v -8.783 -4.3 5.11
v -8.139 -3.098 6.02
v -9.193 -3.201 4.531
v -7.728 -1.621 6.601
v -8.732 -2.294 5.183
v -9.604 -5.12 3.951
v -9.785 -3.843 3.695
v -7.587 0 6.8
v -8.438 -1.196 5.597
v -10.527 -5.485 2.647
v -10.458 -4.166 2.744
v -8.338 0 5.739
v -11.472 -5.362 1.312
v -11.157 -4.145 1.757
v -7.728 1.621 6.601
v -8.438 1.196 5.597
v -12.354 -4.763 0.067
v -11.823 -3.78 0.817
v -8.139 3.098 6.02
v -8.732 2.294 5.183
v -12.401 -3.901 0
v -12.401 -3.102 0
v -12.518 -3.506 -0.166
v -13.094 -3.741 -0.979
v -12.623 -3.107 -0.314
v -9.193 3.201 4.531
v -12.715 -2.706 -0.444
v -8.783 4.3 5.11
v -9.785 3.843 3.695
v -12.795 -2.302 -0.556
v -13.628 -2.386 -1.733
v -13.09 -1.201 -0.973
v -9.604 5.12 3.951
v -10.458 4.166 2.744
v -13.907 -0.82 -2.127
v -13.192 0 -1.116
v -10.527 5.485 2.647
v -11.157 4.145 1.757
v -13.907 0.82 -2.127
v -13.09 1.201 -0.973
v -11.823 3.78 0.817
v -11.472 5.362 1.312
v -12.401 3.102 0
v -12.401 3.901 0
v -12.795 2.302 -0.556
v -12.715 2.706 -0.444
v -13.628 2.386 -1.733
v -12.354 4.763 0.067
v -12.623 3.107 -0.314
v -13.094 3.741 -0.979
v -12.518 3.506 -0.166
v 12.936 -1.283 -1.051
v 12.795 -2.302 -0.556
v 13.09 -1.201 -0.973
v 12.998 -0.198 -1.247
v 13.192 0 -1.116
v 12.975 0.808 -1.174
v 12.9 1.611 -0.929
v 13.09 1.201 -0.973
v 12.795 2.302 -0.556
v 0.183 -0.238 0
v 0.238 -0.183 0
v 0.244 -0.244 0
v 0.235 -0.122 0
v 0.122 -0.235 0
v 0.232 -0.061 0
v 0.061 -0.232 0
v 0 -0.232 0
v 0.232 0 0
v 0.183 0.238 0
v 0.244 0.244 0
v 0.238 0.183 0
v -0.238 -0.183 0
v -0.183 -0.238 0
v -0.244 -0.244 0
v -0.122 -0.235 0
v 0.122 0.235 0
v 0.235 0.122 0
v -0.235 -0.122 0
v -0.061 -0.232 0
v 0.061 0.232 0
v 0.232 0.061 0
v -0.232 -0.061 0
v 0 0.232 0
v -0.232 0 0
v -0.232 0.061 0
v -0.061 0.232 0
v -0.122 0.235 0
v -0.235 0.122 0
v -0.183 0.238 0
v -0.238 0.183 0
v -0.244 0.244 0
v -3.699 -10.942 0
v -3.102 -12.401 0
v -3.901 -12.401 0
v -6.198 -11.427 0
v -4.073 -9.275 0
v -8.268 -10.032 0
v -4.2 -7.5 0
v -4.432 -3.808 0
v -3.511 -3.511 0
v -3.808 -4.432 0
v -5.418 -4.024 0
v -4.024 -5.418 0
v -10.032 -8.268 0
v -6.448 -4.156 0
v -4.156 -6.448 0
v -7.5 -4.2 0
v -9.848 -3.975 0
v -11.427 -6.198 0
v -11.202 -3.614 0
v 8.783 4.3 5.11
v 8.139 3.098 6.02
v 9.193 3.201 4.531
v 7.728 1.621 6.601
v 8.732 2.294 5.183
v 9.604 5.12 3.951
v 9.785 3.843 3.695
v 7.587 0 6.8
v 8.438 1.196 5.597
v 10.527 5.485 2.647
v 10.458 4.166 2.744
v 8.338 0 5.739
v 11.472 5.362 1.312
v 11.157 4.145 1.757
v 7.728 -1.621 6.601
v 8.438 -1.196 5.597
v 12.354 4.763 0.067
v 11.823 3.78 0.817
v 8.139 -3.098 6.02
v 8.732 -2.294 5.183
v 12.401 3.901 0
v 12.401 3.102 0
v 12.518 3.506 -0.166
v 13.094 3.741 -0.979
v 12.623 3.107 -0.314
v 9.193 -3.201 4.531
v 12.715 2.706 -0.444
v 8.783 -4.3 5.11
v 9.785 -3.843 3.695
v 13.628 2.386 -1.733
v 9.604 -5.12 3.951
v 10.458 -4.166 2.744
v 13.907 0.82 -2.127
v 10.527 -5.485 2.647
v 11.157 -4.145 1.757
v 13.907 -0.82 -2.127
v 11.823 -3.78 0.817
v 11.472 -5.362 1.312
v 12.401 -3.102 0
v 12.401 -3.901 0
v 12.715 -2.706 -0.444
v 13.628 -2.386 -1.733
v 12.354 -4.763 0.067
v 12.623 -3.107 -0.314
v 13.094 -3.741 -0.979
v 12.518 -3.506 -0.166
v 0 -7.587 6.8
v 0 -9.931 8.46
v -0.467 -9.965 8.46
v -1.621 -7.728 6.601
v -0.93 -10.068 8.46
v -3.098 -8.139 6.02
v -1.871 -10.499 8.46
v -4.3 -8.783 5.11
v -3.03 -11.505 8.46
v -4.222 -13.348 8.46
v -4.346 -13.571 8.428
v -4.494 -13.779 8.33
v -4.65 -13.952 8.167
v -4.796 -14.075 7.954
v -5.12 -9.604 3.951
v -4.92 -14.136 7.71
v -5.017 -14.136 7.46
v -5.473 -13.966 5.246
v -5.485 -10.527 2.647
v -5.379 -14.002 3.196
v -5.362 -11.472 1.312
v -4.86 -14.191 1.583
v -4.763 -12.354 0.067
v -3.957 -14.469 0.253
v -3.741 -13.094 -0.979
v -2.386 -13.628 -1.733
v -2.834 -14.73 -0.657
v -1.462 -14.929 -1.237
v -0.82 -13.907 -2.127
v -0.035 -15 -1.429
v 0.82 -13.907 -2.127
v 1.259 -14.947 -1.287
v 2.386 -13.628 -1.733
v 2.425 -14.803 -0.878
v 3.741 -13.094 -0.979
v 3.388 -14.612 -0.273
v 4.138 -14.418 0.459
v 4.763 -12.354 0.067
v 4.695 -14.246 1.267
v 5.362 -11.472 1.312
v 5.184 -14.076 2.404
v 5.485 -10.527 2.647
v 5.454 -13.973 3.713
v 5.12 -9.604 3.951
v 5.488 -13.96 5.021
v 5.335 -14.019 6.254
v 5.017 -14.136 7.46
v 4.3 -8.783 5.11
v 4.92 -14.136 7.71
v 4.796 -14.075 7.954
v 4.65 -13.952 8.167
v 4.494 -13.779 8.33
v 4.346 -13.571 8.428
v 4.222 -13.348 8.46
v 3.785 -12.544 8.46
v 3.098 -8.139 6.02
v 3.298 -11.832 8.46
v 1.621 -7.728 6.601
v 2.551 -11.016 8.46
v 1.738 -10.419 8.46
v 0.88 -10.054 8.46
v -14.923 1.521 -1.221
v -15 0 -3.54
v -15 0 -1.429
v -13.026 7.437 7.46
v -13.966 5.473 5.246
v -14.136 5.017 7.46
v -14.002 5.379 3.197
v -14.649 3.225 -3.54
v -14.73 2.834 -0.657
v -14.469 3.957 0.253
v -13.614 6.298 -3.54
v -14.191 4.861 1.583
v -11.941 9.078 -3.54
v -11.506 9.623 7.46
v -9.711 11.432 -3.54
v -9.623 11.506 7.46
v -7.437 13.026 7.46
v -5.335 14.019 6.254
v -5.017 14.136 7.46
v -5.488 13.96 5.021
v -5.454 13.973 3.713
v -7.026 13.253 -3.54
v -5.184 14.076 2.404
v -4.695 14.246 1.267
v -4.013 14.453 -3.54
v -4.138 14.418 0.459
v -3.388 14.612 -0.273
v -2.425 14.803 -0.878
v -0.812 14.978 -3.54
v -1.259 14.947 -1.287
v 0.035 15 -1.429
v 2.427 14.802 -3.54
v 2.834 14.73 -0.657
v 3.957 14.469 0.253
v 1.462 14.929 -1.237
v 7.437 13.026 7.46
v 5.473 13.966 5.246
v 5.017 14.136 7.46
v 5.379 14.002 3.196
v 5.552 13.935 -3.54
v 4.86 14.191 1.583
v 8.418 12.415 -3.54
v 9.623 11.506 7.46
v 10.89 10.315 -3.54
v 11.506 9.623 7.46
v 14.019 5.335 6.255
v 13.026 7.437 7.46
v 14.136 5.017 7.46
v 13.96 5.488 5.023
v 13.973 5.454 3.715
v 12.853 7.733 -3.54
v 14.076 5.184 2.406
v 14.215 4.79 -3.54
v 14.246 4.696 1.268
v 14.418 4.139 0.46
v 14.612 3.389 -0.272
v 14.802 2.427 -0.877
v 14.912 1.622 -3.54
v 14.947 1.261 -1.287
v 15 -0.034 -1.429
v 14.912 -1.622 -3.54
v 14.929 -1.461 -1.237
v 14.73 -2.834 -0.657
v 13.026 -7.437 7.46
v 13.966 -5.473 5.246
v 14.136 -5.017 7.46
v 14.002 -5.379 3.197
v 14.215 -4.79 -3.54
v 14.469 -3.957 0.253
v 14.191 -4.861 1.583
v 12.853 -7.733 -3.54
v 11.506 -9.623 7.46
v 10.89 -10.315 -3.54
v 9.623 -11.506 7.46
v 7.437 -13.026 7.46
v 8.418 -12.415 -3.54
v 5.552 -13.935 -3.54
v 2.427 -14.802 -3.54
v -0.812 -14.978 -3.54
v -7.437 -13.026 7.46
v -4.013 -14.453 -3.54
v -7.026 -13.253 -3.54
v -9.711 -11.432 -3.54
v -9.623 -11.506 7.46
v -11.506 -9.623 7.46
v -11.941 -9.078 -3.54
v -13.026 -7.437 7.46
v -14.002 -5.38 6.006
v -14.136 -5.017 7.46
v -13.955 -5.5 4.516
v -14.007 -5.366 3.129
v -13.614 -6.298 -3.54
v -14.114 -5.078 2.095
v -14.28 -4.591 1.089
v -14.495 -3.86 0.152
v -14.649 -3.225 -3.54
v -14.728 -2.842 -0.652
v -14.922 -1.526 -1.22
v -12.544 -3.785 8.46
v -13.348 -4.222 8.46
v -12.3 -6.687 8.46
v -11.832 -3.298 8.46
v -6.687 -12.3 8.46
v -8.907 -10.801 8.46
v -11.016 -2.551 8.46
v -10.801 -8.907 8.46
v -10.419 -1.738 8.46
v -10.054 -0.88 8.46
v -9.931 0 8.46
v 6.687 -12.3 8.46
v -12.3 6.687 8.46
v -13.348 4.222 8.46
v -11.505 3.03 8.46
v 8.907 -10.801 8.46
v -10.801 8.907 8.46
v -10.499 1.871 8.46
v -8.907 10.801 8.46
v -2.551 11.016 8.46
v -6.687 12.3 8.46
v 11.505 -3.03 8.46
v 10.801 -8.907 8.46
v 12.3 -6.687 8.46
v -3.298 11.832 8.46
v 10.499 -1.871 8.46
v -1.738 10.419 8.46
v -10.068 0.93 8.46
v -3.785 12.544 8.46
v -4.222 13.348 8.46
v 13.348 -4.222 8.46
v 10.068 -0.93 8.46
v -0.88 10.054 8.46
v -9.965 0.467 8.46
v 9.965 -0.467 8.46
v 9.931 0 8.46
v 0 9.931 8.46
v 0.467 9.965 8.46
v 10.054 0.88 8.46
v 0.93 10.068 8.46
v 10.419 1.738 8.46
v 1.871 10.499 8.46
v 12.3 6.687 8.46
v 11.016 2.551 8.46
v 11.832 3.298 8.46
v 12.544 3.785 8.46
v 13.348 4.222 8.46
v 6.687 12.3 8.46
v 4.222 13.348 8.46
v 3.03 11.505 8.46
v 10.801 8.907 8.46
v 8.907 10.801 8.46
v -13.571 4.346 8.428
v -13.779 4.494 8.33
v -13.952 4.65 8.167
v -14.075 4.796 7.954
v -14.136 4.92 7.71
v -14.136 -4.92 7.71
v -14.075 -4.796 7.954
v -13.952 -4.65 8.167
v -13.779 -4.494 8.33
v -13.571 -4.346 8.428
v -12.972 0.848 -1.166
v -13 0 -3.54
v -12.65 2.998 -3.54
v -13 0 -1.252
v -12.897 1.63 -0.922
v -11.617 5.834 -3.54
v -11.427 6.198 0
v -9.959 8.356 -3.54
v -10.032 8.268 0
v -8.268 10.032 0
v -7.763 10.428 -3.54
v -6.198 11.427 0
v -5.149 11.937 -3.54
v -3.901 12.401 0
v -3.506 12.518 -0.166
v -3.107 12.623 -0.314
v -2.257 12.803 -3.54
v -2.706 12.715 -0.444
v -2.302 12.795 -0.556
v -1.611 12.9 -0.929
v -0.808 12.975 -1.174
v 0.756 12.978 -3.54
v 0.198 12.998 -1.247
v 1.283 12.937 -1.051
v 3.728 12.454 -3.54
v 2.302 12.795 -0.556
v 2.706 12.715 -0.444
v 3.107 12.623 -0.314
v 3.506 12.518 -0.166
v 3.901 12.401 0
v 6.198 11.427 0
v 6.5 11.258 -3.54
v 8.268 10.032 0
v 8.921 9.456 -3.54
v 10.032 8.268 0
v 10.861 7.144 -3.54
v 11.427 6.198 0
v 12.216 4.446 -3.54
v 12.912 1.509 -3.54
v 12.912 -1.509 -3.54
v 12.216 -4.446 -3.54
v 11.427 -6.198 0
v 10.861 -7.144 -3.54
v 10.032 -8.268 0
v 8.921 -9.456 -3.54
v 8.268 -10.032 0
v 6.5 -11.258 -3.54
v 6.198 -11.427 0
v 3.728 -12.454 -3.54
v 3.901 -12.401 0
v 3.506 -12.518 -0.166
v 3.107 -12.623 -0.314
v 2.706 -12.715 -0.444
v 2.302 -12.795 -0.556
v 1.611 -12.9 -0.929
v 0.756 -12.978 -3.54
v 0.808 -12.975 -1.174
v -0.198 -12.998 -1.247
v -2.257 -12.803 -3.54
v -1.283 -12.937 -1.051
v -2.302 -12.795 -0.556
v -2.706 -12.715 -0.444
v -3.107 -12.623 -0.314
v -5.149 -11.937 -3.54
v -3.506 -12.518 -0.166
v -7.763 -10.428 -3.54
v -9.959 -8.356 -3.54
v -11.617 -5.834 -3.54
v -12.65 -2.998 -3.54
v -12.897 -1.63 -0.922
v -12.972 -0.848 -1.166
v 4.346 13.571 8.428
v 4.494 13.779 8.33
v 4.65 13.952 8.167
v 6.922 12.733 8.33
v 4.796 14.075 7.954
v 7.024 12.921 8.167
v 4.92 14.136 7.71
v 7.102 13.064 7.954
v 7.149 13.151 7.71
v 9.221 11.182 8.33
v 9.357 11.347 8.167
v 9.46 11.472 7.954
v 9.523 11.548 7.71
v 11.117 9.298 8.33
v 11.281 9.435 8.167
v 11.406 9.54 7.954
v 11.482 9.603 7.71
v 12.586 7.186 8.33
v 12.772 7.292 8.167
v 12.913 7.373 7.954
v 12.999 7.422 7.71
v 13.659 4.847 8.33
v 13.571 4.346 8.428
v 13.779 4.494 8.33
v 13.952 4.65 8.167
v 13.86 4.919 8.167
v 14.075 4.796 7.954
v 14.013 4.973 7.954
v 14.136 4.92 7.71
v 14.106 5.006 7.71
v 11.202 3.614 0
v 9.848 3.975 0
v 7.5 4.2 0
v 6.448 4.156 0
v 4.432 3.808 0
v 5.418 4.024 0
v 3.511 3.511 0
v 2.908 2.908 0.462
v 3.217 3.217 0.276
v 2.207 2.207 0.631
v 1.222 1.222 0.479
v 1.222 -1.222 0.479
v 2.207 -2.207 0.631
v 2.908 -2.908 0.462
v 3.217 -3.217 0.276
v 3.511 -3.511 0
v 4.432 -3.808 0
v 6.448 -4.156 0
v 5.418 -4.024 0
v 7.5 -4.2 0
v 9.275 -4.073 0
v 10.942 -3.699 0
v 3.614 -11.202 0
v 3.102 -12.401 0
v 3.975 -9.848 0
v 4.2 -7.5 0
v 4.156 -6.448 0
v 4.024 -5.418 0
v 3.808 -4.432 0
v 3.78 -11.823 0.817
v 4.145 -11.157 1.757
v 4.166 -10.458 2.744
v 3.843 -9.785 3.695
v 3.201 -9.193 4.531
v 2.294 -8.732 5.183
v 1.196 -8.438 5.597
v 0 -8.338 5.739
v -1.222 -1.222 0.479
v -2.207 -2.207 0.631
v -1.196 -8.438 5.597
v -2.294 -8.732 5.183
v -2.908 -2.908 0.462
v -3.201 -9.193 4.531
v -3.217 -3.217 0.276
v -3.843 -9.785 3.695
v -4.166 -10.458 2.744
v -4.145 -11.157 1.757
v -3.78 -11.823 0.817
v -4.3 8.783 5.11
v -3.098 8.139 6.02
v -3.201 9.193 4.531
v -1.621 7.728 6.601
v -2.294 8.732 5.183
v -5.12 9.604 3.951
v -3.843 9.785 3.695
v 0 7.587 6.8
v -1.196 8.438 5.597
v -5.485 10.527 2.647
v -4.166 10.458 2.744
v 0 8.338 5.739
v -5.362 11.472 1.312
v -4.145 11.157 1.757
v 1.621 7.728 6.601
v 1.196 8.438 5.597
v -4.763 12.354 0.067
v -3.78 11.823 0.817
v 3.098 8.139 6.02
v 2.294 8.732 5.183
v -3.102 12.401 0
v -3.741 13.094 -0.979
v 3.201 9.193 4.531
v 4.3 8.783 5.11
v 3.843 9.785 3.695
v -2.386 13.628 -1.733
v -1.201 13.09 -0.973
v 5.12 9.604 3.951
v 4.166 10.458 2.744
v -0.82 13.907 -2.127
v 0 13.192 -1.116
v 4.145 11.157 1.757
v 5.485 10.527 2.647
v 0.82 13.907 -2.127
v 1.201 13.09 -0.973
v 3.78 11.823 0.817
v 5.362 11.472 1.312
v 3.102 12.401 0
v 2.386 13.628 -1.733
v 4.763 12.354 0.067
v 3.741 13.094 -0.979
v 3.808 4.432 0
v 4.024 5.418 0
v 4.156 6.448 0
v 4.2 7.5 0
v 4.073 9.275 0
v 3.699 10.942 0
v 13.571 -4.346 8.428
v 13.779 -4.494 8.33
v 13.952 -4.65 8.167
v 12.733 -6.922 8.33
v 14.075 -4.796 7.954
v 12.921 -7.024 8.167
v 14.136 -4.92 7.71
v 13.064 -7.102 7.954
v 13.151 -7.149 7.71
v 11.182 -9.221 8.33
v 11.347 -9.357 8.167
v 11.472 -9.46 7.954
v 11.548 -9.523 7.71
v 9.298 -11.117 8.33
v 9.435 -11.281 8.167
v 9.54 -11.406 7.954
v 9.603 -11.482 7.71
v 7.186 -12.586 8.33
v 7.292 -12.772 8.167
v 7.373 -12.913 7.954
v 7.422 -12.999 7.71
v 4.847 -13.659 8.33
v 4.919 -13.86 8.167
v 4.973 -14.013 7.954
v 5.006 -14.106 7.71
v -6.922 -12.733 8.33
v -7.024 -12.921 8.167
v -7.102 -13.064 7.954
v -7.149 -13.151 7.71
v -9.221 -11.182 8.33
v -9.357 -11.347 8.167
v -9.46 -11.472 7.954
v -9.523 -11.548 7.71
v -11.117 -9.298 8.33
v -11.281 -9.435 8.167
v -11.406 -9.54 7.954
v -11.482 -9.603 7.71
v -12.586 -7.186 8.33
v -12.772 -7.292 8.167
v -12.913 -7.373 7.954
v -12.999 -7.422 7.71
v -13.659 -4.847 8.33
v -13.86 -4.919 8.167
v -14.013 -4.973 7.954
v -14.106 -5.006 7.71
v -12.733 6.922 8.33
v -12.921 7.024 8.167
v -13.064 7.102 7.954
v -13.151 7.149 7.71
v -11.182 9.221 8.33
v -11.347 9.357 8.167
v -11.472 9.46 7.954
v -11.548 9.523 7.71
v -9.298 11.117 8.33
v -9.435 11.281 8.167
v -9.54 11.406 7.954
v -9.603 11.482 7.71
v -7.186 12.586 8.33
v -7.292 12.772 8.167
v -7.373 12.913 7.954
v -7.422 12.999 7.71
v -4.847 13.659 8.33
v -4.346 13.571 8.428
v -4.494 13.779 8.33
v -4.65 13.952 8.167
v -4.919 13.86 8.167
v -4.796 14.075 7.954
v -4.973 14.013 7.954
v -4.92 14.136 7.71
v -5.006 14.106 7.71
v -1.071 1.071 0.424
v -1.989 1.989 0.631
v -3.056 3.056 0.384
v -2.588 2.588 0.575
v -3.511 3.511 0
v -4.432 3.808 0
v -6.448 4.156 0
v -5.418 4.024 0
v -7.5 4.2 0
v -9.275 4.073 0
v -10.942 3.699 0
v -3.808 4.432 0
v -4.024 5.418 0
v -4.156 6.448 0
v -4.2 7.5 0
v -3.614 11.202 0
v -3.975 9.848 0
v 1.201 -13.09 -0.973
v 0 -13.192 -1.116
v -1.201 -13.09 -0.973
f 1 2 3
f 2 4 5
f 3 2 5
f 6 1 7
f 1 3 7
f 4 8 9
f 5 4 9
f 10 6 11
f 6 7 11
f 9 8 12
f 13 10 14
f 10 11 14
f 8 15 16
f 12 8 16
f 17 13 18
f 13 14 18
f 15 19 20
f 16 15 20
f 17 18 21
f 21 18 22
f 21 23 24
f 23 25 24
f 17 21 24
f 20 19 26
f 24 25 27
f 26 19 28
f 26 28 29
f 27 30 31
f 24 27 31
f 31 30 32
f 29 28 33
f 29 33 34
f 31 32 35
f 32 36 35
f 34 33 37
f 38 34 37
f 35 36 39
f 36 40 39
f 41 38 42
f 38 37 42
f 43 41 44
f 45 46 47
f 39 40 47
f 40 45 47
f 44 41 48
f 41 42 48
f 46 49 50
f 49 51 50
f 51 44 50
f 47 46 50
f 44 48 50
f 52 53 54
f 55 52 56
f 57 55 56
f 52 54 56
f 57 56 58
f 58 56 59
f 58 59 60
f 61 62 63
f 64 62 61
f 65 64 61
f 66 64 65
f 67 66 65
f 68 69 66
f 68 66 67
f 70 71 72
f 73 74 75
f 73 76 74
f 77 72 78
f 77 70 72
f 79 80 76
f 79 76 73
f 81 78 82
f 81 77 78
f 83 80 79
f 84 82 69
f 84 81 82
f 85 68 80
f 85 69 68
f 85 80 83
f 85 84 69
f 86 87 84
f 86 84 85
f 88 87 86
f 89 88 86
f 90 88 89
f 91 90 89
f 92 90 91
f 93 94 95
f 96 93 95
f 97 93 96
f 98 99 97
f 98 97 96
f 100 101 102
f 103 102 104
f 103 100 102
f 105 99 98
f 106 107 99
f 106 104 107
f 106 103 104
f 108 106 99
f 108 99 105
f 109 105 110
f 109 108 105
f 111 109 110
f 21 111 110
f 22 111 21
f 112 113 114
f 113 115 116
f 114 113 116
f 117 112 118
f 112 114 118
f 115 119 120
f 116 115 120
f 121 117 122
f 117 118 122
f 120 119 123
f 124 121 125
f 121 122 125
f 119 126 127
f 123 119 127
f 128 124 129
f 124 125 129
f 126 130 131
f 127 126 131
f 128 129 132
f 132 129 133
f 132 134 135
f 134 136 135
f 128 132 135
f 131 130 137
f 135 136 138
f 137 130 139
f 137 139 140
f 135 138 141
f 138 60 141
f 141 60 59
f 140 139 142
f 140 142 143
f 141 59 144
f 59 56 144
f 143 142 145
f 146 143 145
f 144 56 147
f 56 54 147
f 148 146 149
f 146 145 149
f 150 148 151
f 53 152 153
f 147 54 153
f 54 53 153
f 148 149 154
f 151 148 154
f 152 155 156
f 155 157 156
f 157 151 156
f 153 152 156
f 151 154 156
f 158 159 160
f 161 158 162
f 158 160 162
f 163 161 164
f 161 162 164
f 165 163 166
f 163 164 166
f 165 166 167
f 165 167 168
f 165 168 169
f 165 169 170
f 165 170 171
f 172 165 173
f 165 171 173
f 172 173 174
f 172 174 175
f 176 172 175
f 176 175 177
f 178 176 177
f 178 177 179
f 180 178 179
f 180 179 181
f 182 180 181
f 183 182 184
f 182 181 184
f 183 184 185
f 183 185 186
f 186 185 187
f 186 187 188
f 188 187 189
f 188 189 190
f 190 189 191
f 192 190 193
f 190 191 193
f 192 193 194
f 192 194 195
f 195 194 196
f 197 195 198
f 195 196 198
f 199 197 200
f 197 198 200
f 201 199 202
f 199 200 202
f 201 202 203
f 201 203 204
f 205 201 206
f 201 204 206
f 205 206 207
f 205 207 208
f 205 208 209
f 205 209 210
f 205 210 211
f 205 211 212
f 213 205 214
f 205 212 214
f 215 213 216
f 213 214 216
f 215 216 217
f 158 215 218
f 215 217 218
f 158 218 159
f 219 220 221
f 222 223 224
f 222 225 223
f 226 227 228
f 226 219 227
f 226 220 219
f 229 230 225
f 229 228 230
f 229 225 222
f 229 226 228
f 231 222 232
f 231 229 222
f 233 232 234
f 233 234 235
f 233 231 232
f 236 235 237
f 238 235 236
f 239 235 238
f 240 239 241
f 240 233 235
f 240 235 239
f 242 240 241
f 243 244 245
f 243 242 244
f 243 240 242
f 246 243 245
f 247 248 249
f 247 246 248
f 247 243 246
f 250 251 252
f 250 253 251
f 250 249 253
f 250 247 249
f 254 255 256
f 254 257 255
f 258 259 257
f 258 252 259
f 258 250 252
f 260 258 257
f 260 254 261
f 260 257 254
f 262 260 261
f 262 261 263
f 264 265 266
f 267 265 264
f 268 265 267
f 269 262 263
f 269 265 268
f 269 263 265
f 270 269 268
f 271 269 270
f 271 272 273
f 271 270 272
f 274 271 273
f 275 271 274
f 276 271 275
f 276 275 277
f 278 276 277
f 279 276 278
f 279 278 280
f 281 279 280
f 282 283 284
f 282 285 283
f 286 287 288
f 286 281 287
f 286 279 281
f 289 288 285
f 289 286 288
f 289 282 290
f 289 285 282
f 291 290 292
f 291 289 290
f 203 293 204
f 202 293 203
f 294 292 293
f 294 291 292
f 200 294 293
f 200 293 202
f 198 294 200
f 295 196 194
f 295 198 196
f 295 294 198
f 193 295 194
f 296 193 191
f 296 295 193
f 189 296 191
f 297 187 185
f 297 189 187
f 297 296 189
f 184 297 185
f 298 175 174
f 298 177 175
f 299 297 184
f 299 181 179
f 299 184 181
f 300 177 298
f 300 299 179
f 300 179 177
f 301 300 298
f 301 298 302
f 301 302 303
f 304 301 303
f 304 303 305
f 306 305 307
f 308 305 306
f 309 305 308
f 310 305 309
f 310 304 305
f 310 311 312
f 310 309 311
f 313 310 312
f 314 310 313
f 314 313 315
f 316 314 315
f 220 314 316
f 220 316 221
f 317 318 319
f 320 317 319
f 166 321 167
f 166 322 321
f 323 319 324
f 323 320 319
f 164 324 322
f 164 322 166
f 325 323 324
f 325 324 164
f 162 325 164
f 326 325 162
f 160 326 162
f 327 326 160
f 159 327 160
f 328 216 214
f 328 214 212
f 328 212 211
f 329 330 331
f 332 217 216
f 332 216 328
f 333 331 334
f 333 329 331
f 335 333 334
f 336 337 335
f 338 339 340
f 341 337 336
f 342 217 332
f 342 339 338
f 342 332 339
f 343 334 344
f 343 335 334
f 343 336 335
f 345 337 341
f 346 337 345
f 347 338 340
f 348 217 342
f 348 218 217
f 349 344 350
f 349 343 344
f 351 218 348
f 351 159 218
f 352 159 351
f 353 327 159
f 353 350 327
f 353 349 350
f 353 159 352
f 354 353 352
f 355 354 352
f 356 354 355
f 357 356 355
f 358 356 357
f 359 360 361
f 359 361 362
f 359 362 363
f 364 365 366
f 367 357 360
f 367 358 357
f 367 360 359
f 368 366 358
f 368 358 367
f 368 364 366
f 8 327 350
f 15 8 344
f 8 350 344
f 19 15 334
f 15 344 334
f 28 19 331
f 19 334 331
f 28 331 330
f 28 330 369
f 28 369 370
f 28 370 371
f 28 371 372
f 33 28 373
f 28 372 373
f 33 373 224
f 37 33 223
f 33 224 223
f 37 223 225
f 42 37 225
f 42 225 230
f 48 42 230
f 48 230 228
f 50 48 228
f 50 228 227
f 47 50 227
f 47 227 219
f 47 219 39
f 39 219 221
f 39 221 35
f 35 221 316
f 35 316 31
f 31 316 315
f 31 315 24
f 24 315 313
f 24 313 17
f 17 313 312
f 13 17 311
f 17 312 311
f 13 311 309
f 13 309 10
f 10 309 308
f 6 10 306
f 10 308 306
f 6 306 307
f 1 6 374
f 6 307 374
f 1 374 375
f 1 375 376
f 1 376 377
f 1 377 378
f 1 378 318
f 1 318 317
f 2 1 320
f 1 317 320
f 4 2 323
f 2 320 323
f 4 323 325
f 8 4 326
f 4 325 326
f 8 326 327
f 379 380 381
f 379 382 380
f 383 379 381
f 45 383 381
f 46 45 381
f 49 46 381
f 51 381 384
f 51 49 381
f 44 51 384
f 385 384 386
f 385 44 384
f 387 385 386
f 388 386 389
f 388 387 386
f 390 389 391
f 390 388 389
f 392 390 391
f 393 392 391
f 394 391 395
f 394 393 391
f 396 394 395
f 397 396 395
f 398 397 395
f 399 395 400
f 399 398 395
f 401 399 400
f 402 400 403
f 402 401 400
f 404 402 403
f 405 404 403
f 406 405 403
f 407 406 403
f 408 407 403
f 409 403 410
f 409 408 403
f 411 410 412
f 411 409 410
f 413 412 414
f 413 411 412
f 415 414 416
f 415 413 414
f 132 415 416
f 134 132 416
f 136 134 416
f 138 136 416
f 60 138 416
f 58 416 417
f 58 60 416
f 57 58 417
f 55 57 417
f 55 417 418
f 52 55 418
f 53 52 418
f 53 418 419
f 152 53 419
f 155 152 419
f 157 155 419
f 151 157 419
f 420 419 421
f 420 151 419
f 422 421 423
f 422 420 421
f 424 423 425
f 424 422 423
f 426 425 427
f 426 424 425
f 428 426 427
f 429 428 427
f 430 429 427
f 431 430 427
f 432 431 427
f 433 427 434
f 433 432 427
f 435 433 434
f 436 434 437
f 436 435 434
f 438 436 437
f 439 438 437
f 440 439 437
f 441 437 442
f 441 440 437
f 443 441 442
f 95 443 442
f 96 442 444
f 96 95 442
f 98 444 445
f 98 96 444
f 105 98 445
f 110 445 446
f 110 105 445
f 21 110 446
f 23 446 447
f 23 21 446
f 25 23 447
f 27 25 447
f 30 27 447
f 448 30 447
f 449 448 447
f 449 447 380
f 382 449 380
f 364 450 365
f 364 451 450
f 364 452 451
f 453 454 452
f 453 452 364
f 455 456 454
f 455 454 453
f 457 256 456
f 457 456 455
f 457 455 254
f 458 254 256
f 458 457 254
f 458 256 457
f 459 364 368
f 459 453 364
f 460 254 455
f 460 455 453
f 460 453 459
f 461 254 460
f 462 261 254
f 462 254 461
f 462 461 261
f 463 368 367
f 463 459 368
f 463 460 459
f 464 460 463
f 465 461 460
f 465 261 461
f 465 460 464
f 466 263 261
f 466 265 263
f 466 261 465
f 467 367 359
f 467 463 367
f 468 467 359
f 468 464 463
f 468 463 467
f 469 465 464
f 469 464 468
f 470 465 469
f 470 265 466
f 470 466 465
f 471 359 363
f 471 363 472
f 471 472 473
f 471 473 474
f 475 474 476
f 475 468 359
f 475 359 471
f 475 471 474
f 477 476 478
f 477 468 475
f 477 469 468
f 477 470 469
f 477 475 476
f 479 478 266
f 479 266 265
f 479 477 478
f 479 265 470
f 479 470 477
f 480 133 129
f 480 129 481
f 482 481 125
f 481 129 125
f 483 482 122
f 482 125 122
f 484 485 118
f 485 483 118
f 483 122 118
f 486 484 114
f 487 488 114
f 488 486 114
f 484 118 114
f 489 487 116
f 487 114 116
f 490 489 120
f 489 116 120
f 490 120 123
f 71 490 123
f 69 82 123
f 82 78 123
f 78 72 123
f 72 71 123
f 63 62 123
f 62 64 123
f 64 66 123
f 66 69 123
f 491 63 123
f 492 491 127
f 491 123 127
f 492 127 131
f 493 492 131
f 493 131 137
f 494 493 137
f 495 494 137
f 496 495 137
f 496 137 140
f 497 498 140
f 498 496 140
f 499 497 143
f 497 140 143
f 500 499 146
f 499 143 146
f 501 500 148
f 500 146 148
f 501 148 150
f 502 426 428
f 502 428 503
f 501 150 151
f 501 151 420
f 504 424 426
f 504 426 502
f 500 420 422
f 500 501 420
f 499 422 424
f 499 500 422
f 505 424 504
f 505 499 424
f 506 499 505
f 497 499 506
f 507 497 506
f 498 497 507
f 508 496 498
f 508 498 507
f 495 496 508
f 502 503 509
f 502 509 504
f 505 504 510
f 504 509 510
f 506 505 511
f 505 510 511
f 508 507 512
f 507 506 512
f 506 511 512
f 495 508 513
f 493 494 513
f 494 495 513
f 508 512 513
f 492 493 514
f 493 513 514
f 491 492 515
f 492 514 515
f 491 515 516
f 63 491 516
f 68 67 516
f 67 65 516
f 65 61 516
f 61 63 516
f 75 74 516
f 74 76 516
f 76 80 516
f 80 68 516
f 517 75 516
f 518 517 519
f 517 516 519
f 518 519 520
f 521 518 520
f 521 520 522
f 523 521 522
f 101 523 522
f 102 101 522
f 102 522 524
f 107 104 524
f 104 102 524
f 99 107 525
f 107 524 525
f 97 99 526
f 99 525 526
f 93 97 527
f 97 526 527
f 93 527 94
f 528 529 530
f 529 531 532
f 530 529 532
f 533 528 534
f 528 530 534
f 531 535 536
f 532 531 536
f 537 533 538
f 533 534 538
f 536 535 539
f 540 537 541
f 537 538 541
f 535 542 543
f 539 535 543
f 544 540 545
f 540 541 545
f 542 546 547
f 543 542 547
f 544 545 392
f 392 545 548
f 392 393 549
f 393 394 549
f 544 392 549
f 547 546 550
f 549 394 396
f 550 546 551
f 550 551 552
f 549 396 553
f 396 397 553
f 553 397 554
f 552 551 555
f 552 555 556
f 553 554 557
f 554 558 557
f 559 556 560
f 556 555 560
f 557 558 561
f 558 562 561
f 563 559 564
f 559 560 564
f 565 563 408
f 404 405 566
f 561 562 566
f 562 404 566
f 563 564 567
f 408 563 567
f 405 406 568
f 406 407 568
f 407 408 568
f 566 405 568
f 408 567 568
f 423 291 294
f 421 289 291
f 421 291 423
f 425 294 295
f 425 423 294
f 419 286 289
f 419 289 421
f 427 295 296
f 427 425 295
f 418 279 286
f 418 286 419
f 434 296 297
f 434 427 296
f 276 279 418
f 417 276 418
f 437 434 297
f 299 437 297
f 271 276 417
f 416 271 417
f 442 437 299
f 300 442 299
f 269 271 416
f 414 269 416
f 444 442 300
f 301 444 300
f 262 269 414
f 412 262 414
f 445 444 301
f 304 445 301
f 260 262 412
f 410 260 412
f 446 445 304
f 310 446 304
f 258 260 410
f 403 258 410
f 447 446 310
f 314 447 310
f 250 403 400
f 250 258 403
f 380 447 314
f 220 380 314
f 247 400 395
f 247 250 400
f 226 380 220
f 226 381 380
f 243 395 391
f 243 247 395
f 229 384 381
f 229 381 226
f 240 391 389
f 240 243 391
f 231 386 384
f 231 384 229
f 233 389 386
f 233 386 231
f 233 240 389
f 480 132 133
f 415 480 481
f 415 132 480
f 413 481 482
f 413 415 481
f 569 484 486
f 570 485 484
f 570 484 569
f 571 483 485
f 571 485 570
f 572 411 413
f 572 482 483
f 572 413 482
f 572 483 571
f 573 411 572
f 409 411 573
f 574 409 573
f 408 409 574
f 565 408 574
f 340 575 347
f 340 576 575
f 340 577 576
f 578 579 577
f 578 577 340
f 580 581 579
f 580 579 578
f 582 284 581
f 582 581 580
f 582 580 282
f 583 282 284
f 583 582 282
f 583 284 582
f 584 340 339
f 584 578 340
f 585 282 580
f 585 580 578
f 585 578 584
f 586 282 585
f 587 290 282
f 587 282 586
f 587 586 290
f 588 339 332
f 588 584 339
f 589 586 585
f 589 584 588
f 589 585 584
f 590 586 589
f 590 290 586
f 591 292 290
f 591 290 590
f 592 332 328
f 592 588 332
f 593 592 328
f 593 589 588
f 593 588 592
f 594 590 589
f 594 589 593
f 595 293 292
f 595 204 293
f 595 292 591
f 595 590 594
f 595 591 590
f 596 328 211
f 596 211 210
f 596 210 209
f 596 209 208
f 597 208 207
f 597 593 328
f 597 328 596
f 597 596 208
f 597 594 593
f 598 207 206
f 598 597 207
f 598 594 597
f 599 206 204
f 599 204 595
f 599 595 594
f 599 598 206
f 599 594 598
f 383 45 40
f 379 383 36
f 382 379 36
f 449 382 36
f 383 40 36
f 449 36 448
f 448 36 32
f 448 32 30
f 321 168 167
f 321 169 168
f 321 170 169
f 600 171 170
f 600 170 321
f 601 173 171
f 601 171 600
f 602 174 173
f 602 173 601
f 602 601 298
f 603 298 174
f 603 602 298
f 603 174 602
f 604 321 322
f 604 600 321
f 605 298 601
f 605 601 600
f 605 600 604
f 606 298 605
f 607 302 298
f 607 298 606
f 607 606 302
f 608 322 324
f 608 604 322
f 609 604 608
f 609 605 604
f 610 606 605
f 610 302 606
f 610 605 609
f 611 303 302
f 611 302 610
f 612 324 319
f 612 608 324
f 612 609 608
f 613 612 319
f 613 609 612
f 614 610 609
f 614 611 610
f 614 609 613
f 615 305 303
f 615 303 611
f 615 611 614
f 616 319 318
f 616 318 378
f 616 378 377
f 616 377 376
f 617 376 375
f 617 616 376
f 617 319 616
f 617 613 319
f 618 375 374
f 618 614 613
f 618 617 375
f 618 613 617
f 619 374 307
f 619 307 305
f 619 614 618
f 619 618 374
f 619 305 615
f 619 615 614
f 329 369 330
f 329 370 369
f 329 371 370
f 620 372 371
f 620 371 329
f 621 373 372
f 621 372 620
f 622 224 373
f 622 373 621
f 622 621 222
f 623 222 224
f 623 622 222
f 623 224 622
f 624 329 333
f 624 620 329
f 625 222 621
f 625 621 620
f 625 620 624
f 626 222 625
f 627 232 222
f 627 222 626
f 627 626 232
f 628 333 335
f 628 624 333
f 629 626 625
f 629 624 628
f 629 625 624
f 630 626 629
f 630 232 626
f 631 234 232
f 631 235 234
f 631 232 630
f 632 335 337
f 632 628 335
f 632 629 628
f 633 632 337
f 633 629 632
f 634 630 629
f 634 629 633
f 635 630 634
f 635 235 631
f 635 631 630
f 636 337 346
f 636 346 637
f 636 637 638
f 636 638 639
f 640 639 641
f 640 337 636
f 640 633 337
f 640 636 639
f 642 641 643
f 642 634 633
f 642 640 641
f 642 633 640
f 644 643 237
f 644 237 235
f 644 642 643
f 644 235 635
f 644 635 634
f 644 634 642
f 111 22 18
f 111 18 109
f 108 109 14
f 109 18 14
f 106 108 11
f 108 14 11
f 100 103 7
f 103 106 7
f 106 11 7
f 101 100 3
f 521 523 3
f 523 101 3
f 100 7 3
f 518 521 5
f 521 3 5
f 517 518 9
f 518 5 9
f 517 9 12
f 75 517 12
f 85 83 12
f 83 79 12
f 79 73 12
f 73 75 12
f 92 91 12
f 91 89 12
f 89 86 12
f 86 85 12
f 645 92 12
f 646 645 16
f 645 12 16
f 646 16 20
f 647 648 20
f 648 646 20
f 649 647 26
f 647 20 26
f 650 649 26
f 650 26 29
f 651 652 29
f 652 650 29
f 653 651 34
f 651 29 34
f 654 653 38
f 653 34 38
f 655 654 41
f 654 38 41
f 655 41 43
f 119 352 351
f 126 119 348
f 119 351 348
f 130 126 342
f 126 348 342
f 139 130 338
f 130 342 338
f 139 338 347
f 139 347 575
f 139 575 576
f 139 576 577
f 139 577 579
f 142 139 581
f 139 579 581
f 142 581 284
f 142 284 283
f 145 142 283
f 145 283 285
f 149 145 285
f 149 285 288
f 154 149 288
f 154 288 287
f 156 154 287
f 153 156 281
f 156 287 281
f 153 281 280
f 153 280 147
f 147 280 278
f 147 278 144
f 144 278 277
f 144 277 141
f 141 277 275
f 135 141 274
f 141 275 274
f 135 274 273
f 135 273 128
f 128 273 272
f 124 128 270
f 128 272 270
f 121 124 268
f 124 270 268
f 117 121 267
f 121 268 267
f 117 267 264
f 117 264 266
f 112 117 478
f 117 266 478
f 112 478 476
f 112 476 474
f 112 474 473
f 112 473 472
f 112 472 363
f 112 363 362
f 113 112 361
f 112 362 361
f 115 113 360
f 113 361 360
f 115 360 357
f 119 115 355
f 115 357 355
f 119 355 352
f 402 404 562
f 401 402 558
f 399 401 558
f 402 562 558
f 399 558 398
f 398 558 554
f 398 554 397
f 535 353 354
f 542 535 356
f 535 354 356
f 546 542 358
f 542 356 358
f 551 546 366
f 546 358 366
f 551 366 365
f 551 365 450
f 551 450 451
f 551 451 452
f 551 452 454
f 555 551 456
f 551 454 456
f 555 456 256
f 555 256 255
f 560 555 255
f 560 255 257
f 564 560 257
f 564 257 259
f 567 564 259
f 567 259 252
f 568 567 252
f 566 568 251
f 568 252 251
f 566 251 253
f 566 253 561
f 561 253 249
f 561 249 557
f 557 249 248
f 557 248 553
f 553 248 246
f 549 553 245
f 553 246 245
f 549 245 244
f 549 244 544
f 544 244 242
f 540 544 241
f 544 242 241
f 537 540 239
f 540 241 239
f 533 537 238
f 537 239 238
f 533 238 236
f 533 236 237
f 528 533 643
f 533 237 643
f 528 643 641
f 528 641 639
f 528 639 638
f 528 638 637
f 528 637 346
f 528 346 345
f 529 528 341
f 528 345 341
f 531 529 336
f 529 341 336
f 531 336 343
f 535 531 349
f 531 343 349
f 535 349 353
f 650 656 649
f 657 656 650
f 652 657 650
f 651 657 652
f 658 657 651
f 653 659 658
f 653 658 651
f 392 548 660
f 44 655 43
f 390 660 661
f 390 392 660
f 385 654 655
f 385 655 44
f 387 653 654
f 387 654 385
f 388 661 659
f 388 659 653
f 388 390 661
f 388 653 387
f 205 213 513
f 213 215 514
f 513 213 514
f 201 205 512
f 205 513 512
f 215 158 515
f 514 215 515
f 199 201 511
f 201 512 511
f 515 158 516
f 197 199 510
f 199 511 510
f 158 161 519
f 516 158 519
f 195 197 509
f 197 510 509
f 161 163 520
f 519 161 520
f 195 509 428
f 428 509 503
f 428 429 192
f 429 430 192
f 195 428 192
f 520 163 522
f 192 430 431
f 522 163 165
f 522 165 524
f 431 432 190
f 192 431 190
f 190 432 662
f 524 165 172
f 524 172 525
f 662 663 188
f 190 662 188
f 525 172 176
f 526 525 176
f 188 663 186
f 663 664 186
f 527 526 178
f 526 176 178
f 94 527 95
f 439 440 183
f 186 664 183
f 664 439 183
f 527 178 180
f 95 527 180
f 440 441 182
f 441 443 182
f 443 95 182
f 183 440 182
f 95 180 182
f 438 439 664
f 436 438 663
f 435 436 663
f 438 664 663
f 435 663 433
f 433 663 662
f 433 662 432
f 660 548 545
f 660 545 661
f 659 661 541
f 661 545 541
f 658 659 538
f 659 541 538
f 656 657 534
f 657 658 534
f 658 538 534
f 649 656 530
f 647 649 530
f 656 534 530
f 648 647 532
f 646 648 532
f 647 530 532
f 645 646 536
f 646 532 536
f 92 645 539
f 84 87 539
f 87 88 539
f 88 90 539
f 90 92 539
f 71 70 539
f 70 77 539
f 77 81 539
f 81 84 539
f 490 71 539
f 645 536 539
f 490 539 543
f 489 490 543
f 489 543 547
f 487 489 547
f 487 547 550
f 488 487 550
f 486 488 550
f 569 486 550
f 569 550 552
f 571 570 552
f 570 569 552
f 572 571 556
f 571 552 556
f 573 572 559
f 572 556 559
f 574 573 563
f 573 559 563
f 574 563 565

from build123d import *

# Parameters (mm, degrees)
F6_COPIES_COUNT = 4
F7_R            = 1


# Not quite as in the source:
# - a pattern or mirror of a feature is missing from the dataset's text; its kind, count and spacing are read off the source's solid


with BuildPart() as f4:
    # F3 (on Front) → F4 (revolve)
    with BuildSketch(Plane.XZ):
        Polygon((0, 0), (0, 8.46), (-15, 8.46), (-15, -3.54), (-13, -3.54), (-13, 0), align=None)
    revolve(axis=Axis((0, 0, -4.2355582118), (0, 0, -1)))

    # F5 (on Front) → F6 (revolve, cut)
    with BuildSketch(Plane.XZ):
        Polygon((-0.1761714047, -0.0391753335), (-5.0730880905, 3.4278416801), (-8.3376992144, 5.7391863558), (-7.5865121948, 6.800184971), (-14.1157344425, 11.4228743224), (-17.2938333716, 6.9340340271), (-7.5, 0), (-2.5972818806, -3.4588228983), align=None)
    f6 = revolve(axis=Axis((-9.8969166858, 0, 1.6970170136), (-0.816152781, 0, 0.5778361689)), mode=Mode.SUBTRACT)

    # F6_copies: F6 ×4 about axis
    f6_copies_axis = Axis((0, 0, 0), (0, 0, 1))
    for i in range(1, F6_COPIES_COUNT):
        add(f6.rotate(f6_copies_axis, i * 360 / F6_COPIES_COUNT), mode=Mode.SUBTRACT)

    # F7
    f7_edges = [f4.edges().sort_by_distance(p)[0] for p in [
        (-10.606602, 10.606602, 8.46),
        (10.606602, 10.606602, 8.46),
        (10.606602, -10.606602, 8.46),
        (-10.606602, -10.606602, 8.46),
    ]]
    fillet(f7_edges, radius=F7_R)


solid = f4.part
